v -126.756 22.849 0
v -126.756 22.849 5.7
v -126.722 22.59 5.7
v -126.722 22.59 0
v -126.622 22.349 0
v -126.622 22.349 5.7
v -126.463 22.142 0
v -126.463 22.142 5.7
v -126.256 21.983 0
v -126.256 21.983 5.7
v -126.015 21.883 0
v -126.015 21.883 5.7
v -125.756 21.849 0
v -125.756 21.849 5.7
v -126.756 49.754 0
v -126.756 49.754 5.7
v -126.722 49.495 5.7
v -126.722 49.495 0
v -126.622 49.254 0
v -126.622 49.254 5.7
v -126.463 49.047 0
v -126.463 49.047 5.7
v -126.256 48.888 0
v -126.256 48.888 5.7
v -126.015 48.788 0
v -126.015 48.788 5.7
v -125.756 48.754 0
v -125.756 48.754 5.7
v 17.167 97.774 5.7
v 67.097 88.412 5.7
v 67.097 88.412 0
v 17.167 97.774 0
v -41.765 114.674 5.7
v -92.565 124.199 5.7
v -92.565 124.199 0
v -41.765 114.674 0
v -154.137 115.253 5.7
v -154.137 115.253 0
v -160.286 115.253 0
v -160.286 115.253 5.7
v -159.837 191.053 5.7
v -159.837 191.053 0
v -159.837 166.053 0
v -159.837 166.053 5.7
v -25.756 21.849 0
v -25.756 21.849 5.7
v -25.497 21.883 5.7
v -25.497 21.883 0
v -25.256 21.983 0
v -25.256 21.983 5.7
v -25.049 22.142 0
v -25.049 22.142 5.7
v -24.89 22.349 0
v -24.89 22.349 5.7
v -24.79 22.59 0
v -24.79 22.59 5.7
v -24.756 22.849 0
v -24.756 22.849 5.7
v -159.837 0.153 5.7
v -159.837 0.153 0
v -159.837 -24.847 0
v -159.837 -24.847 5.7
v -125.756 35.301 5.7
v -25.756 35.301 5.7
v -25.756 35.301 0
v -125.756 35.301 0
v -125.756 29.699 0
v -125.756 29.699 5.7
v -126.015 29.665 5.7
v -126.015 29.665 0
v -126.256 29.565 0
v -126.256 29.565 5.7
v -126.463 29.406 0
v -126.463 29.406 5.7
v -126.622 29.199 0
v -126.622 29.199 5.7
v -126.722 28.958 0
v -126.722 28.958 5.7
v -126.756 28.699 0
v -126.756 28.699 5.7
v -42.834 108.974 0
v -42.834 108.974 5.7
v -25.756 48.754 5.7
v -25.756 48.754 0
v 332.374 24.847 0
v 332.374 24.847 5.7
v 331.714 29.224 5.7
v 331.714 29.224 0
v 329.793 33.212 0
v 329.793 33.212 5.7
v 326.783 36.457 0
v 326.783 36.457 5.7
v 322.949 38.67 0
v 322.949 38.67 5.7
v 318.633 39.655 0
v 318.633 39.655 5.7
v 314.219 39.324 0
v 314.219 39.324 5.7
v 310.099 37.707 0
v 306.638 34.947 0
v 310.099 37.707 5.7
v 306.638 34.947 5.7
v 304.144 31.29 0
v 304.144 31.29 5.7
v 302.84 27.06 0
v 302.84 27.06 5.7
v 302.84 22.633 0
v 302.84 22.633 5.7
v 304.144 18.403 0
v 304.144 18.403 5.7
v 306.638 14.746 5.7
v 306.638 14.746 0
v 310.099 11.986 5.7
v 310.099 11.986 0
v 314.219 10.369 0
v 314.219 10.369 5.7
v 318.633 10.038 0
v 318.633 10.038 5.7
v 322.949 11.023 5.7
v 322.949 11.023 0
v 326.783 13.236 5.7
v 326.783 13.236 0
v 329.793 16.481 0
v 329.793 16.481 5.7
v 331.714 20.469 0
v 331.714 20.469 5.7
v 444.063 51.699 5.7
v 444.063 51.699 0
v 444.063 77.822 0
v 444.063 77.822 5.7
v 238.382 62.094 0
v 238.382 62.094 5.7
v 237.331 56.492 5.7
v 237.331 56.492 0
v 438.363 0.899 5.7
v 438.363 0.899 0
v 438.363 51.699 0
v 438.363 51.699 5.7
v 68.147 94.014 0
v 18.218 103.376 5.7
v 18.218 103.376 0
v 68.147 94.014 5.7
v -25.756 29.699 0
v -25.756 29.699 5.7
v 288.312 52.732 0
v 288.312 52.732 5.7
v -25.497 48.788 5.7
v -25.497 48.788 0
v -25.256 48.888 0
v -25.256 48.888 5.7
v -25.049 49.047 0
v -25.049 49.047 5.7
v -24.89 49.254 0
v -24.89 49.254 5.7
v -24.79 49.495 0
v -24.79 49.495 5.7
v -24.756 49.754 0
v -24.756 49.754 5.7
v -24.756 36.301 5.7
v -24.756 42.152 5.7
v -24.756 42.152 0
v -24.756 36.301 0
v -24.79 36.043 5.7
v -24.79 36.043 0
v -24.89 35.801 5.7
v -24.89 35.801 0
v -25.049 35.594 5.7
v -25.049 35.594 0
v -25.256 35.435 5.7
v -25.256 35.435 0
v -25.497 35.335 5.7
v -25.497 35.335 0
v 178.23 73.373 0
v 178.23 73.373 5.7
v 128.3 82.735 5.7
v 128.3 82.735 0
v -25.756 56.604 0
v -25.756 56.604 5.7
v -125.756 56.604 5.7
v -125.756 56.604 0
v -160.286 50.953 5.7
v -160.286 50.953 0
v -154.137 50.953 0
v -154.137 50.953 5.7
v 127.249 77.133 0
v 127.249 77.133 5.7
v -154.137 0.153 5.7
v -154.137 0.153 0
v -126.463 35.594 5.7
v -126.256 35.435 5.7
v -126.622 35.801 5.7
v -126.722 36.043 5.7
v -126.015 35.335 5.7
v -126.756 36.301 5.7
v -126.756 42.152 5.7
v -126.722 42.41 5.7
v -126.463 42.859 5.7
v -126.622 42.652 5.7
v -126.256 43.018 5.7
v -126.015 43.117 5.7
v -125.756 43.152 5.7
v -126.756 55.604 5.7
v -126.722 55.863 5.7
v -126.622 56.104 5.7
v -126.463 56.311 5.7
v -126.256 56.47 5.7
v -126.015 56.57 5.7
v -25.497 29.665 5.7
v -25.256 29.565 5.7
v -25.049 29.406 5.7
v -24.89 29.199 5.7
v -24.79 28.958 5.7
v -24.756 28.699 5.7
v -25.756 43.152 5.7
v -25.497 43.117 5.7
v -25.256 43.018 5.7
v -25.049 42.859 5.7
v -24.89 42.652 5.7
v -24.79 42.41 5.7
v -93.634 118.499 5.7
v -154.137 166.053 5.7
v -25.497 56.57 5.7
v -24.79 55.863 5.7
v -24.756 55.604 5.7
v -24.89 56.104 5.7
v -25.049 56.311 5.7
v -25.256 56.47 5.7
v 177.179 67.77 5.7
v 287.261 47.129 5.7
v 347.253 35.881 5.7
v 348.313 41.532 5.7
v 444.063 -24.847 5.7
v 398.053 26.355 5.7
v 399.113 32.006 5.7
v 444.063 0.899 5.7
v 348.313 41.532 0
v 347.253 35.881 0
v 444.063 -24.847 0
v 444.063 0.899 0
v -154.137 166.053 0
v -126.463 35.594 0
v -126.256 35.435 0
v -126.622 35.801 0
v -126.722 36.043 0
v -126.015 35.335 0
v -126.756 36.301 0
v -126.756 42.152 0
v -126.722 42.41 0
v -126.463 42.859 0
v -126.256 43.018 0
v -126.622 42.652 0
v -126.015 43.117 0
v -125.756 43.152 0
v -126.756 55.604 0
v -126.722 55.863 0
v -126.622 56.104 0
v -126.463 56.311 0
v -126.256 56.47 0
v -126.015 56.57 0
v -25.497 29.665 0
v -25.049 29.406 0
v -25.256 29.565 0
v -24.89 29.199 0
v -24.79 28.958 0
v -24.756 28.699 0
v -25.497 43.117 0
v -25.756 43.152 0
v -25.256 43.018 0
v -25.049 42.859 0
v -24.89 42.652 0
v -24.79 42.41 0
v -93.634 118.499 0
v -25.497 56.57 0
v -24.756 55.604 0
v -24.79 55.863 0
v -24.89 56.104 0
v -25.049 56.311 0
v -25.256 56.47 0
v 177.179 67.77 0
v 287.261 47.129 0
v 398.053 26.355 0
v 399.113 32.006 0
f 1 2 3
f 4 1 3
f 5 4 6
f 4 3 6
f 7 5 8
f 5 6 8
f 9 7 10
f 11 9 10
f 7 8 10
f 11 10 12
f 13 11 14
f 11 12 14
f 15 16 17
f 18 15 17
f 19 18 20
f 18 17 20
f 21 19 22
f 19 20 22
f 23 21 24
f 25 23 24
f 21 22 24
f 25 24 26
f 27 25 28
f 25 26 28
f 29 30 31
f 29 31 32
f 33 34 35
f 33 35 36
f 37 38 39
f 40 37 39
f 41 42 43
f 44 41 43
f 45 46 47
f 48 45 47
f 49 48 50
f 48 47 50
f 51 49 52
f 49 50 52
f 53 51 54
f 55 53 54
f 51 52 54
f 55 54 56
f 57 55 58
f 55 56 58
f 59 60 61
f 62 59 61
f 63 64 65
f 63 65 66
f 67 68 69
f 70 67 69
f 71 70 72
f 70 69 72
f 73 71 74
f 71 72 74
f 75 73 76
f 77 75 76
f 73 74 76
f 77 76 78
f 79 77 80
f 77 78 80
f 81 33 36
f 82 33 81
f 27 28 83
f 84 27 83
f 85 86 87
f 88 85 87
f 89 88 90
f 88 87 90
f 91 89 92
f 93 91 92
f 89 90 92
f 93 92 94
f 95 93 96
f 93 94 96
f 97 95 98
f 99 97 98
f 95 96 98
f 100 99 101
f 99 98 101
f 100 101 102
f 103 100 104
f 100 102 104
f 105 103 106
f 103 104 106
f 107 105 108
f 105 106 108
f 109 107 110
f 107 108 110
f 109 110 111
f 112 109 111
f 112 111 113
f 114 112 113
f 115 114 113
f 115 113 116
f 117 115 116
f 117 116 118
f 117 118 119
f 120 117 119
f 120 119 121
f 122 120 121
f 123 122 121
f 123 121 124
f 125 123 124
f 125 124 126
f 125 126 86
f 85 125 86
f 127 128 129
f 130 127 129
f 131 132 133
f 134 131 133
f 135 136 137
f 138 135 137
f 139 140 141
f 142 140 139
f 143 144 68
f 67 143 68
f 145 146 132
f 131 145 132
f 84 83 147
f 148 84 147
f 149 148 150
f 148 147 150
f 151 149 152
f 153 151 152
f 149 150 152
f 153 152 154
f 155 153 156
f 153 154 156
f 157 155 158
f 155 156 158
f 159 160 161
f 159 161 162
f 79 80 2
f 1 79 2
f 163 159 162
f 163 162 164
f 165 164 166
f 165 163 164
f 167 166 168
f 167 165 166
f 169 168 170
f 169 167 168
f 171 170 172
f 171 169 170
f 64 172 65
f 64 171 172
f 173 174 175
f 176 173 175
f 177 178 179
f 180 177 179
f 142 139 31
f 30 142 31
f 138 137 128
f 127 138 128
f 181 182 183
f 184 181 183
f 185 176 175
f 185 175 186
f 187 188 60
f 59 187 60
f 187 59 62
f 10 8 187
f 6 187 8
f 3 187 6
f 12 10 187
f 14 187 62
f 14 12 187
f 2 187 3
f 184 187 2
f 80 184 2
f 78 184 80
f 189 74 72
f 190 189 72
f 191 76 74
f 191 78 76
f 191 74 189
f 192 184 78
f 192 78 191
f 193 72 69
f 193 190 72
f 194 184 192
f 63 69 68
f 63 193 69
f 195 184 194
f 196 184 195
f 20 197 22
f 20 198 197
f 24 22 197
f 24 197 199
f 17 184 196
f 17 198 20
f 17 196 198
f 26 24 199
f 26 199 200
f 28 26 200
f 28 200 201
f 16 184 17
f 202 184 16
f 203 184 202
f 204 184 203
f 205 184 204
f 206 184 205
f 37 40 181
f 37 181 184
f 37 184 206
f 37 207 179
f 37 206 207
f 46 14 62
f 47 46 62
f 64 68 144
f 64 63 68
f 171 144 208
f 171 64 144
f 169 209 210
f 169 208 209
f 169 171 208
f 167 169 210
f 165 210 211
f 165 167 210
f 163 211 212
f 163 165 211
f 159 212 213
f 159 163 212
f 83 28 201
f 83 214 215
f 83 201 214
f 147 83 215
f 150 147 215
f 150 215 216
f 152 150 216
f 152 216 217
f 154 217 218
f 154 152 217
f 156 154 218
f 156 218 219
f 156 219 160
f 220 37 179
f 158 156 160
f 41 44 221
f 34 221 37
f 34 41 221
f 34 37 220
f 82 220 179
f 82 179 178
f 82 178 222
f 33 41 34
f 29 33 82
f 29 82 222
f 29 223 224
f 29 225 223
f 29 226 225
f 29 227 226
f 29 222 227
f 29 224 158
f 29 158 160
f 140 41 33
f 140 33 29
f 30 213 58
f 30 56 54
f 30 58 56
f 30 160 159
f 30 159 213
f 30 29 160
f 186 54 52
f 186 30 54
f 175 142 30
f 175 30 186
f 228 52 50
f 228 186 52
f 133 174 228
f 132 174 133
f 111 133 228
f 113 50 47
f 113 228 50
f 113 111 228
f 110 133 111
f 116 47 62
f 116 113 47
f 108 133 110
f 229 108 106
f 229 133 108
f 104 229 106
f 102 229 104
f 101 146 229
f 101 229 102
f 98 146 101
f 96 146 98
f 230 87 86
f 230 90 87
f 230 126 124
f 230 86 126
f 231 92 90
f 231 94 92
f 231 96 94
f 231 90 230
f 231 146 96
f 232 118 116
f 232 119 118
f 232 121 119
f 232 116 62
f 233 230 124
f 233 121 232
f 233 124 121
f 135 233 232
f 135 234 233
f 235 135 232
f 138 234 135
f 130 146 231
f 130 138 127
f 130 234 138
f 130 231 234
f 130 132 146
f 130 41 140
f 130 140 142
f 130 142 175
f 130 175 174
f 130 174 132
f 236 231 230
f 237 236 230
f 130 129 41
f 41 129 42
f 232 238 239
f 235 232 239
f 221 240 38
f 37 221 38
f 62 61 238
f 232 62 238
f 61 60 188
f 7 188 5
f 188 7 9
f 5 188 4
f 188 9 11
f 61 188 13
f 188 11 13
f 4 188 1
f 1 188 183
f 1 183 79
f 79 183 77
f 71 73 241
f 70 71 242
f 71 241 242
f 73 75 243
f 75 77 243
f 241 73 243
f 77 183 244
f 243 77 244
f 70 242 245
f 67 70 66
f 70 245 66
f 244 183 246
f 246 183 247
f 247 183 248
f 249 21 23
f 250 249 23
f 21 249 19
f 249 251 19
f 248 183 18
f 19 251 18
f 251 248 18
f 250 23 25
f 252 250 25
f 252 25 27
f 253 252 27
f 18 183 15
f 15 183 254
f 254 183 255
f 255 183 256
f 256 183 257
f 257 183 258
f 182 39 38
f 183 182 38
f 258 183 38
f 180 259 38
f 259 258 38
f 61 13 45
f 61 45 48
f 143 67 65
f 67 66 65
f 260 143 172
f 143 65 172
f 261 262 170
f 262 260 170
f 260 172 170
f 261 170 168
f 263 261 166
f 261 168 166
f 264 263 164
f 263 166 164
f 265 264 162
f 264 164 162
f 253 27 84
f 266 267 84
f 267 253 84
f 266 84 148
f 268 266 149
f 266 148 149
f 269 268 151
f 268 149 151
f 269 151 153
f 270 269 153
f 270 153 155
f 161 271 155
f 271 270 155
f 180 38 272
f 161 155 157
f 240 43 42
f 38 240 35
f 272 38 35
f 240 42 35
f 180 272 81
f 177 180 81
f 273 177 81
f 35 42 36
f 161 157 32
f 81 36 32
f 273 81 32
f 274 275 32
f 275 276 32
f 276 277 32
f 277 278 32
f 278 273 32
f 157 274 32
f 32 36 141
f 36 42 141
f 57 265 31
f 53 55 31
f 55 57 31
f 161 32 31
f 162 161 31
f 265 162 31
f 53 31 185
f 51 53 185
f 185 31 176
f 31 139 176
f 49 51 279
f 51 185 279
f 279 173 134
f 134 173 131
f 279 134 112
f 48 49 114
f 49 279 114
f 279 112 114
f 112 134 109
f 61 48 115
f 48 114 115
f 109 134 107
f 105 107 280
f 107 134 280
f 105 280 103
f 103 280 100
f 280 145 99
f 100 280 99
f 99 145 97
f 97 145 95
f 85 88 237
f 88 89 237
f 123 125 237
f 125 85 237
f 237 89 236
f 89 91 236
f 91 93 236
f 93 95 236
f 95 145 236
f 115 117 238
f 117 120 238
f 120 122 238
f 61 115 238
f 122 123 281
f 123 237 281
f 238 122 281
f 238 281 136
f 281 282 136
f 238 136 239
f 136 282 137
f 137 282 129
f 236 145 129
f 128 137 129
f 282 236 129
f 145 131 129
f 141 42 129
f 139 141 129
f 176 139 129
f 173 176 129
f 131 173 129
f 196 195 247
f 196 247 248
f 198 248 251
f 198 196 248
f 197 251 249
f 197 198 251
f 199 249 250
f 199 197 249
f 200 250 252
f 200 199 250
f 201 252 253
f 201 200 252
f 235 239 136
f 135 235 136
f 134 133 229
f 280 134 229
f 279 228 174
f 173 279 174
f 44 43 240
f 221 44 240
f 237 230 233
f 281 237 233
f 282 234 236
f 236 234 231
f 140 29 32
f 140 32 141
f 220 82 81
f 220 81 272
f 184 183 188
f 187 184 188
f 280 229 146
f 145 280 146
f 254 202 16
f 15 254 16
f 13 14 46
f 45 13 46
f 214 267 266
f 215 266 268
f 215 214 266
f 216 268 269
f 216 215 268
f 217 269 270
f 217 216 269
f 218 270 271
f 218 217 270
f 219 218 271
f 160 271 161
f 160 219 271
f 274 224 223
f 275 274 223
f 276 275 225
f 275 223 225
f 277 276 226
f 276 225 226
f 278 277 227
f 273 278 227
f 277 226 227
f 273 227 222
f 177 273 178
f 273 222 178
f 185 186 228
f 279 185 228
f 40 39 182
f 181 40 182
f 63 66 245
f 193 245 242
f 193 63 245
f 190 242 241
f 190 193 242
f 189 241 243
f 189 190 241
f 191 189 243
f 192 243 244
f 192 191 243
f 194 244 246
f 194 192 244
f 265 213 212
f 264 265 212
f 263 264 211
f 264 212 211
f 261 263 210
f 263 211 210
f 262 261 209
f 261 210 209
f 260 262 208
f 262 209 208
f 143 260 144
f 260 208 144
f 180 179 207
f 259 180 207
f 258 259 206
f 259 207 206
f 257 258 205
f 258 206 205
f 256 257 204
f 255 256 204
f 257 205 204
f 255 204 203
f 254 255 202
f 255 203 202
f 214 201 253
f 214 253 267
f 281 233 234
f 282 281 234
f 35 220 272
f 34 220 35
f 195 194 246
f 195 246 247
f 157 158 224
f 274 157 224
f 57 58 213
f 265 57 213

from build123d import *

# Parameters (mm, degrees)
BOSS_EXTRUDE1_DEPTH = 5.7
SKETCH2_R           = 14.85
CUT_EXTRUDE1_DEPTH  = 6.7


with BuildPart() as part:
    # Sketch1 → Boss-Extrude1 (new body)
    with BuildSketch(Plane.XY):
        Polygon((-159.83650641, 166.052929421), (-154.13650641, 166.052929421), (-154.13650641, 115.252929421), (-160.286019508, 115.252929421), (-160.286019508, 50.952929421), (-154.13650641, 50.952929421), (-154.13650641, 0.152929421), (-159.83650641, 0.152929421), (-159.83650641, -24.847070579), (444.06349359, -24.847070579), (444.06349359, 0.899402865), (438.36349359, 0.899402865), (438.36349359, 51.699402865), (444.06349359, 51.699402865), (444.06349359, 77.821679421), (-159.83650641, 191.052929421), align=None)
    extrude(amount=BOSS_EXTRUDE1_DEPTH)

    # Sketch2 → Cut-Extrude1 (cut, through all)
    with BuildSketch(Plane.XY.offset(5.7)):
        with Locations((317.523696403, 24.846574105)):
            Circle(SKETCH2_R)
        Polygon((287.261228118, 47.129406511), (288.311706475, 52.731771656), (238.381855706, 62.093929643), (237.331377349, 56.491564498), align=None)
        Polygon((177.179115935, 67.770488147), (178.229594292, 73.372853292), (128.299743522, 82.735011279), (127.249265166, 77.132646134), align=None)
        Polygon((-92.56491366, 124.199043845), (-41.76491366, 114.673727458), (-42.83369916, 108.973727458), (-93.63369916, 118.499043845), align=None)
        Polygon((18.217631339, 103.376092915), (68.147482108, 94.013934928), (67.097003751, 88.411569783), (17.167152982, 97.77372777), align=None)
        with BuildLine():
            Line((-24.756085794, 42.151529897), (-24.756085794, 36.301350189))
            ThreePointArc((-24.756085794, 36.301350189), (-25.048979012, 35.594243408), (-25.756085794, 35.301350189))
            Line((-25.756085794, 35.301350189), (-125.756085794, 35.301350189))
            ThreePointArc((-125.756085794, 35.301350189), (-126.463192575, 35.594243408), (-126.756085794, 36.301350189))
            Line((-126.756085794, 36.301350189), (-126.756085794, 42.151529897))
            ThreePointArc((-126.756085794, 42.151529897), (-126.463192575, 42.858636678), (-125.756085794, 43.151529897))
            Line((-125.756085794, 43.151529897), (-25.756085794, 43.151529897))
            ThreePointArc((-25.756085794, 43.151529897), (-25.048979012, 42.858636678), (-24.756085794, 42.151529897))
        make_face()
        Polygon((348.312558617, 41.531771968), (347.252926688, 35.880589395), (398.052926688, 26.355273008), (399.112558617, 32.006455581), align=None)
        with BuildLine():
            Line((-25.756085794, 56.60407475), (-125.756085794, 56.60407475))
            ThreePointArc((-125.756085794, 56.60407475), (-126.463192575, 56.311181531), (-126.756085794, 55.60407475))
            Line((-126.756085794, 55.60407475), (-126.756085794, 49.753895042))
            ThreePointArc((-126.756085794, 49.753895042), (-126.463192575, 49.046788261), (-125.756085794, 48.753895042))
            Line((-125.756085794, 48.753895042), (-25.756085794, 48.753895042))
            ThreePointArc((-25.756085794, 48.753895042), (-25.048979012, 49.046788261), (-24.756085794, 49.753895042))
            Line((-24.756085794, 49.753895042), (-24.756085794, 55.60407475))
            ThreePointArc((-24.756085794, 55.60407475), (-25.048979012, 56.311181531), (-25.756085794, 56.60407475))
        make_face()
        with BuildLine():
            Line((-25.756085794, 29.698985049), (-125.756085794, 29.698985049))
            ThreePointArc((-125.756085794, 29.698985049), (-126.463192575, 29.40609183), (-126.756085794, 28.698985049))
            Line((-126.756085794, 28.698985049), (-126.756085794, 22.848805341))
            ThreePointArc((-126.756085794, 22.848805341), (-126.463192575, 22.14169856), (-125.756085794, 21.848805341))
            Line((-125.756085794, 21.848805341), (-25.756085794, 21.848805341))
            ThreePointArc((-25.756085794, 21.848805341), (-25.048979012, 22.14169856), (-24.756085794, 22.848805341))
            Line((-24.756085794, 22.848805341), (-24.756085794, 28.698985049))
            ThreePointArc((-24.756085794, 28.698985049), (-25.048979012, 29.40609183), (-25.756085794, 29.698985049))
        make_face()
    extrude(amount=-CUT_EXTRUDE1_DEPTH, mode=Mode.SUBTRACT)


solid = part.part
